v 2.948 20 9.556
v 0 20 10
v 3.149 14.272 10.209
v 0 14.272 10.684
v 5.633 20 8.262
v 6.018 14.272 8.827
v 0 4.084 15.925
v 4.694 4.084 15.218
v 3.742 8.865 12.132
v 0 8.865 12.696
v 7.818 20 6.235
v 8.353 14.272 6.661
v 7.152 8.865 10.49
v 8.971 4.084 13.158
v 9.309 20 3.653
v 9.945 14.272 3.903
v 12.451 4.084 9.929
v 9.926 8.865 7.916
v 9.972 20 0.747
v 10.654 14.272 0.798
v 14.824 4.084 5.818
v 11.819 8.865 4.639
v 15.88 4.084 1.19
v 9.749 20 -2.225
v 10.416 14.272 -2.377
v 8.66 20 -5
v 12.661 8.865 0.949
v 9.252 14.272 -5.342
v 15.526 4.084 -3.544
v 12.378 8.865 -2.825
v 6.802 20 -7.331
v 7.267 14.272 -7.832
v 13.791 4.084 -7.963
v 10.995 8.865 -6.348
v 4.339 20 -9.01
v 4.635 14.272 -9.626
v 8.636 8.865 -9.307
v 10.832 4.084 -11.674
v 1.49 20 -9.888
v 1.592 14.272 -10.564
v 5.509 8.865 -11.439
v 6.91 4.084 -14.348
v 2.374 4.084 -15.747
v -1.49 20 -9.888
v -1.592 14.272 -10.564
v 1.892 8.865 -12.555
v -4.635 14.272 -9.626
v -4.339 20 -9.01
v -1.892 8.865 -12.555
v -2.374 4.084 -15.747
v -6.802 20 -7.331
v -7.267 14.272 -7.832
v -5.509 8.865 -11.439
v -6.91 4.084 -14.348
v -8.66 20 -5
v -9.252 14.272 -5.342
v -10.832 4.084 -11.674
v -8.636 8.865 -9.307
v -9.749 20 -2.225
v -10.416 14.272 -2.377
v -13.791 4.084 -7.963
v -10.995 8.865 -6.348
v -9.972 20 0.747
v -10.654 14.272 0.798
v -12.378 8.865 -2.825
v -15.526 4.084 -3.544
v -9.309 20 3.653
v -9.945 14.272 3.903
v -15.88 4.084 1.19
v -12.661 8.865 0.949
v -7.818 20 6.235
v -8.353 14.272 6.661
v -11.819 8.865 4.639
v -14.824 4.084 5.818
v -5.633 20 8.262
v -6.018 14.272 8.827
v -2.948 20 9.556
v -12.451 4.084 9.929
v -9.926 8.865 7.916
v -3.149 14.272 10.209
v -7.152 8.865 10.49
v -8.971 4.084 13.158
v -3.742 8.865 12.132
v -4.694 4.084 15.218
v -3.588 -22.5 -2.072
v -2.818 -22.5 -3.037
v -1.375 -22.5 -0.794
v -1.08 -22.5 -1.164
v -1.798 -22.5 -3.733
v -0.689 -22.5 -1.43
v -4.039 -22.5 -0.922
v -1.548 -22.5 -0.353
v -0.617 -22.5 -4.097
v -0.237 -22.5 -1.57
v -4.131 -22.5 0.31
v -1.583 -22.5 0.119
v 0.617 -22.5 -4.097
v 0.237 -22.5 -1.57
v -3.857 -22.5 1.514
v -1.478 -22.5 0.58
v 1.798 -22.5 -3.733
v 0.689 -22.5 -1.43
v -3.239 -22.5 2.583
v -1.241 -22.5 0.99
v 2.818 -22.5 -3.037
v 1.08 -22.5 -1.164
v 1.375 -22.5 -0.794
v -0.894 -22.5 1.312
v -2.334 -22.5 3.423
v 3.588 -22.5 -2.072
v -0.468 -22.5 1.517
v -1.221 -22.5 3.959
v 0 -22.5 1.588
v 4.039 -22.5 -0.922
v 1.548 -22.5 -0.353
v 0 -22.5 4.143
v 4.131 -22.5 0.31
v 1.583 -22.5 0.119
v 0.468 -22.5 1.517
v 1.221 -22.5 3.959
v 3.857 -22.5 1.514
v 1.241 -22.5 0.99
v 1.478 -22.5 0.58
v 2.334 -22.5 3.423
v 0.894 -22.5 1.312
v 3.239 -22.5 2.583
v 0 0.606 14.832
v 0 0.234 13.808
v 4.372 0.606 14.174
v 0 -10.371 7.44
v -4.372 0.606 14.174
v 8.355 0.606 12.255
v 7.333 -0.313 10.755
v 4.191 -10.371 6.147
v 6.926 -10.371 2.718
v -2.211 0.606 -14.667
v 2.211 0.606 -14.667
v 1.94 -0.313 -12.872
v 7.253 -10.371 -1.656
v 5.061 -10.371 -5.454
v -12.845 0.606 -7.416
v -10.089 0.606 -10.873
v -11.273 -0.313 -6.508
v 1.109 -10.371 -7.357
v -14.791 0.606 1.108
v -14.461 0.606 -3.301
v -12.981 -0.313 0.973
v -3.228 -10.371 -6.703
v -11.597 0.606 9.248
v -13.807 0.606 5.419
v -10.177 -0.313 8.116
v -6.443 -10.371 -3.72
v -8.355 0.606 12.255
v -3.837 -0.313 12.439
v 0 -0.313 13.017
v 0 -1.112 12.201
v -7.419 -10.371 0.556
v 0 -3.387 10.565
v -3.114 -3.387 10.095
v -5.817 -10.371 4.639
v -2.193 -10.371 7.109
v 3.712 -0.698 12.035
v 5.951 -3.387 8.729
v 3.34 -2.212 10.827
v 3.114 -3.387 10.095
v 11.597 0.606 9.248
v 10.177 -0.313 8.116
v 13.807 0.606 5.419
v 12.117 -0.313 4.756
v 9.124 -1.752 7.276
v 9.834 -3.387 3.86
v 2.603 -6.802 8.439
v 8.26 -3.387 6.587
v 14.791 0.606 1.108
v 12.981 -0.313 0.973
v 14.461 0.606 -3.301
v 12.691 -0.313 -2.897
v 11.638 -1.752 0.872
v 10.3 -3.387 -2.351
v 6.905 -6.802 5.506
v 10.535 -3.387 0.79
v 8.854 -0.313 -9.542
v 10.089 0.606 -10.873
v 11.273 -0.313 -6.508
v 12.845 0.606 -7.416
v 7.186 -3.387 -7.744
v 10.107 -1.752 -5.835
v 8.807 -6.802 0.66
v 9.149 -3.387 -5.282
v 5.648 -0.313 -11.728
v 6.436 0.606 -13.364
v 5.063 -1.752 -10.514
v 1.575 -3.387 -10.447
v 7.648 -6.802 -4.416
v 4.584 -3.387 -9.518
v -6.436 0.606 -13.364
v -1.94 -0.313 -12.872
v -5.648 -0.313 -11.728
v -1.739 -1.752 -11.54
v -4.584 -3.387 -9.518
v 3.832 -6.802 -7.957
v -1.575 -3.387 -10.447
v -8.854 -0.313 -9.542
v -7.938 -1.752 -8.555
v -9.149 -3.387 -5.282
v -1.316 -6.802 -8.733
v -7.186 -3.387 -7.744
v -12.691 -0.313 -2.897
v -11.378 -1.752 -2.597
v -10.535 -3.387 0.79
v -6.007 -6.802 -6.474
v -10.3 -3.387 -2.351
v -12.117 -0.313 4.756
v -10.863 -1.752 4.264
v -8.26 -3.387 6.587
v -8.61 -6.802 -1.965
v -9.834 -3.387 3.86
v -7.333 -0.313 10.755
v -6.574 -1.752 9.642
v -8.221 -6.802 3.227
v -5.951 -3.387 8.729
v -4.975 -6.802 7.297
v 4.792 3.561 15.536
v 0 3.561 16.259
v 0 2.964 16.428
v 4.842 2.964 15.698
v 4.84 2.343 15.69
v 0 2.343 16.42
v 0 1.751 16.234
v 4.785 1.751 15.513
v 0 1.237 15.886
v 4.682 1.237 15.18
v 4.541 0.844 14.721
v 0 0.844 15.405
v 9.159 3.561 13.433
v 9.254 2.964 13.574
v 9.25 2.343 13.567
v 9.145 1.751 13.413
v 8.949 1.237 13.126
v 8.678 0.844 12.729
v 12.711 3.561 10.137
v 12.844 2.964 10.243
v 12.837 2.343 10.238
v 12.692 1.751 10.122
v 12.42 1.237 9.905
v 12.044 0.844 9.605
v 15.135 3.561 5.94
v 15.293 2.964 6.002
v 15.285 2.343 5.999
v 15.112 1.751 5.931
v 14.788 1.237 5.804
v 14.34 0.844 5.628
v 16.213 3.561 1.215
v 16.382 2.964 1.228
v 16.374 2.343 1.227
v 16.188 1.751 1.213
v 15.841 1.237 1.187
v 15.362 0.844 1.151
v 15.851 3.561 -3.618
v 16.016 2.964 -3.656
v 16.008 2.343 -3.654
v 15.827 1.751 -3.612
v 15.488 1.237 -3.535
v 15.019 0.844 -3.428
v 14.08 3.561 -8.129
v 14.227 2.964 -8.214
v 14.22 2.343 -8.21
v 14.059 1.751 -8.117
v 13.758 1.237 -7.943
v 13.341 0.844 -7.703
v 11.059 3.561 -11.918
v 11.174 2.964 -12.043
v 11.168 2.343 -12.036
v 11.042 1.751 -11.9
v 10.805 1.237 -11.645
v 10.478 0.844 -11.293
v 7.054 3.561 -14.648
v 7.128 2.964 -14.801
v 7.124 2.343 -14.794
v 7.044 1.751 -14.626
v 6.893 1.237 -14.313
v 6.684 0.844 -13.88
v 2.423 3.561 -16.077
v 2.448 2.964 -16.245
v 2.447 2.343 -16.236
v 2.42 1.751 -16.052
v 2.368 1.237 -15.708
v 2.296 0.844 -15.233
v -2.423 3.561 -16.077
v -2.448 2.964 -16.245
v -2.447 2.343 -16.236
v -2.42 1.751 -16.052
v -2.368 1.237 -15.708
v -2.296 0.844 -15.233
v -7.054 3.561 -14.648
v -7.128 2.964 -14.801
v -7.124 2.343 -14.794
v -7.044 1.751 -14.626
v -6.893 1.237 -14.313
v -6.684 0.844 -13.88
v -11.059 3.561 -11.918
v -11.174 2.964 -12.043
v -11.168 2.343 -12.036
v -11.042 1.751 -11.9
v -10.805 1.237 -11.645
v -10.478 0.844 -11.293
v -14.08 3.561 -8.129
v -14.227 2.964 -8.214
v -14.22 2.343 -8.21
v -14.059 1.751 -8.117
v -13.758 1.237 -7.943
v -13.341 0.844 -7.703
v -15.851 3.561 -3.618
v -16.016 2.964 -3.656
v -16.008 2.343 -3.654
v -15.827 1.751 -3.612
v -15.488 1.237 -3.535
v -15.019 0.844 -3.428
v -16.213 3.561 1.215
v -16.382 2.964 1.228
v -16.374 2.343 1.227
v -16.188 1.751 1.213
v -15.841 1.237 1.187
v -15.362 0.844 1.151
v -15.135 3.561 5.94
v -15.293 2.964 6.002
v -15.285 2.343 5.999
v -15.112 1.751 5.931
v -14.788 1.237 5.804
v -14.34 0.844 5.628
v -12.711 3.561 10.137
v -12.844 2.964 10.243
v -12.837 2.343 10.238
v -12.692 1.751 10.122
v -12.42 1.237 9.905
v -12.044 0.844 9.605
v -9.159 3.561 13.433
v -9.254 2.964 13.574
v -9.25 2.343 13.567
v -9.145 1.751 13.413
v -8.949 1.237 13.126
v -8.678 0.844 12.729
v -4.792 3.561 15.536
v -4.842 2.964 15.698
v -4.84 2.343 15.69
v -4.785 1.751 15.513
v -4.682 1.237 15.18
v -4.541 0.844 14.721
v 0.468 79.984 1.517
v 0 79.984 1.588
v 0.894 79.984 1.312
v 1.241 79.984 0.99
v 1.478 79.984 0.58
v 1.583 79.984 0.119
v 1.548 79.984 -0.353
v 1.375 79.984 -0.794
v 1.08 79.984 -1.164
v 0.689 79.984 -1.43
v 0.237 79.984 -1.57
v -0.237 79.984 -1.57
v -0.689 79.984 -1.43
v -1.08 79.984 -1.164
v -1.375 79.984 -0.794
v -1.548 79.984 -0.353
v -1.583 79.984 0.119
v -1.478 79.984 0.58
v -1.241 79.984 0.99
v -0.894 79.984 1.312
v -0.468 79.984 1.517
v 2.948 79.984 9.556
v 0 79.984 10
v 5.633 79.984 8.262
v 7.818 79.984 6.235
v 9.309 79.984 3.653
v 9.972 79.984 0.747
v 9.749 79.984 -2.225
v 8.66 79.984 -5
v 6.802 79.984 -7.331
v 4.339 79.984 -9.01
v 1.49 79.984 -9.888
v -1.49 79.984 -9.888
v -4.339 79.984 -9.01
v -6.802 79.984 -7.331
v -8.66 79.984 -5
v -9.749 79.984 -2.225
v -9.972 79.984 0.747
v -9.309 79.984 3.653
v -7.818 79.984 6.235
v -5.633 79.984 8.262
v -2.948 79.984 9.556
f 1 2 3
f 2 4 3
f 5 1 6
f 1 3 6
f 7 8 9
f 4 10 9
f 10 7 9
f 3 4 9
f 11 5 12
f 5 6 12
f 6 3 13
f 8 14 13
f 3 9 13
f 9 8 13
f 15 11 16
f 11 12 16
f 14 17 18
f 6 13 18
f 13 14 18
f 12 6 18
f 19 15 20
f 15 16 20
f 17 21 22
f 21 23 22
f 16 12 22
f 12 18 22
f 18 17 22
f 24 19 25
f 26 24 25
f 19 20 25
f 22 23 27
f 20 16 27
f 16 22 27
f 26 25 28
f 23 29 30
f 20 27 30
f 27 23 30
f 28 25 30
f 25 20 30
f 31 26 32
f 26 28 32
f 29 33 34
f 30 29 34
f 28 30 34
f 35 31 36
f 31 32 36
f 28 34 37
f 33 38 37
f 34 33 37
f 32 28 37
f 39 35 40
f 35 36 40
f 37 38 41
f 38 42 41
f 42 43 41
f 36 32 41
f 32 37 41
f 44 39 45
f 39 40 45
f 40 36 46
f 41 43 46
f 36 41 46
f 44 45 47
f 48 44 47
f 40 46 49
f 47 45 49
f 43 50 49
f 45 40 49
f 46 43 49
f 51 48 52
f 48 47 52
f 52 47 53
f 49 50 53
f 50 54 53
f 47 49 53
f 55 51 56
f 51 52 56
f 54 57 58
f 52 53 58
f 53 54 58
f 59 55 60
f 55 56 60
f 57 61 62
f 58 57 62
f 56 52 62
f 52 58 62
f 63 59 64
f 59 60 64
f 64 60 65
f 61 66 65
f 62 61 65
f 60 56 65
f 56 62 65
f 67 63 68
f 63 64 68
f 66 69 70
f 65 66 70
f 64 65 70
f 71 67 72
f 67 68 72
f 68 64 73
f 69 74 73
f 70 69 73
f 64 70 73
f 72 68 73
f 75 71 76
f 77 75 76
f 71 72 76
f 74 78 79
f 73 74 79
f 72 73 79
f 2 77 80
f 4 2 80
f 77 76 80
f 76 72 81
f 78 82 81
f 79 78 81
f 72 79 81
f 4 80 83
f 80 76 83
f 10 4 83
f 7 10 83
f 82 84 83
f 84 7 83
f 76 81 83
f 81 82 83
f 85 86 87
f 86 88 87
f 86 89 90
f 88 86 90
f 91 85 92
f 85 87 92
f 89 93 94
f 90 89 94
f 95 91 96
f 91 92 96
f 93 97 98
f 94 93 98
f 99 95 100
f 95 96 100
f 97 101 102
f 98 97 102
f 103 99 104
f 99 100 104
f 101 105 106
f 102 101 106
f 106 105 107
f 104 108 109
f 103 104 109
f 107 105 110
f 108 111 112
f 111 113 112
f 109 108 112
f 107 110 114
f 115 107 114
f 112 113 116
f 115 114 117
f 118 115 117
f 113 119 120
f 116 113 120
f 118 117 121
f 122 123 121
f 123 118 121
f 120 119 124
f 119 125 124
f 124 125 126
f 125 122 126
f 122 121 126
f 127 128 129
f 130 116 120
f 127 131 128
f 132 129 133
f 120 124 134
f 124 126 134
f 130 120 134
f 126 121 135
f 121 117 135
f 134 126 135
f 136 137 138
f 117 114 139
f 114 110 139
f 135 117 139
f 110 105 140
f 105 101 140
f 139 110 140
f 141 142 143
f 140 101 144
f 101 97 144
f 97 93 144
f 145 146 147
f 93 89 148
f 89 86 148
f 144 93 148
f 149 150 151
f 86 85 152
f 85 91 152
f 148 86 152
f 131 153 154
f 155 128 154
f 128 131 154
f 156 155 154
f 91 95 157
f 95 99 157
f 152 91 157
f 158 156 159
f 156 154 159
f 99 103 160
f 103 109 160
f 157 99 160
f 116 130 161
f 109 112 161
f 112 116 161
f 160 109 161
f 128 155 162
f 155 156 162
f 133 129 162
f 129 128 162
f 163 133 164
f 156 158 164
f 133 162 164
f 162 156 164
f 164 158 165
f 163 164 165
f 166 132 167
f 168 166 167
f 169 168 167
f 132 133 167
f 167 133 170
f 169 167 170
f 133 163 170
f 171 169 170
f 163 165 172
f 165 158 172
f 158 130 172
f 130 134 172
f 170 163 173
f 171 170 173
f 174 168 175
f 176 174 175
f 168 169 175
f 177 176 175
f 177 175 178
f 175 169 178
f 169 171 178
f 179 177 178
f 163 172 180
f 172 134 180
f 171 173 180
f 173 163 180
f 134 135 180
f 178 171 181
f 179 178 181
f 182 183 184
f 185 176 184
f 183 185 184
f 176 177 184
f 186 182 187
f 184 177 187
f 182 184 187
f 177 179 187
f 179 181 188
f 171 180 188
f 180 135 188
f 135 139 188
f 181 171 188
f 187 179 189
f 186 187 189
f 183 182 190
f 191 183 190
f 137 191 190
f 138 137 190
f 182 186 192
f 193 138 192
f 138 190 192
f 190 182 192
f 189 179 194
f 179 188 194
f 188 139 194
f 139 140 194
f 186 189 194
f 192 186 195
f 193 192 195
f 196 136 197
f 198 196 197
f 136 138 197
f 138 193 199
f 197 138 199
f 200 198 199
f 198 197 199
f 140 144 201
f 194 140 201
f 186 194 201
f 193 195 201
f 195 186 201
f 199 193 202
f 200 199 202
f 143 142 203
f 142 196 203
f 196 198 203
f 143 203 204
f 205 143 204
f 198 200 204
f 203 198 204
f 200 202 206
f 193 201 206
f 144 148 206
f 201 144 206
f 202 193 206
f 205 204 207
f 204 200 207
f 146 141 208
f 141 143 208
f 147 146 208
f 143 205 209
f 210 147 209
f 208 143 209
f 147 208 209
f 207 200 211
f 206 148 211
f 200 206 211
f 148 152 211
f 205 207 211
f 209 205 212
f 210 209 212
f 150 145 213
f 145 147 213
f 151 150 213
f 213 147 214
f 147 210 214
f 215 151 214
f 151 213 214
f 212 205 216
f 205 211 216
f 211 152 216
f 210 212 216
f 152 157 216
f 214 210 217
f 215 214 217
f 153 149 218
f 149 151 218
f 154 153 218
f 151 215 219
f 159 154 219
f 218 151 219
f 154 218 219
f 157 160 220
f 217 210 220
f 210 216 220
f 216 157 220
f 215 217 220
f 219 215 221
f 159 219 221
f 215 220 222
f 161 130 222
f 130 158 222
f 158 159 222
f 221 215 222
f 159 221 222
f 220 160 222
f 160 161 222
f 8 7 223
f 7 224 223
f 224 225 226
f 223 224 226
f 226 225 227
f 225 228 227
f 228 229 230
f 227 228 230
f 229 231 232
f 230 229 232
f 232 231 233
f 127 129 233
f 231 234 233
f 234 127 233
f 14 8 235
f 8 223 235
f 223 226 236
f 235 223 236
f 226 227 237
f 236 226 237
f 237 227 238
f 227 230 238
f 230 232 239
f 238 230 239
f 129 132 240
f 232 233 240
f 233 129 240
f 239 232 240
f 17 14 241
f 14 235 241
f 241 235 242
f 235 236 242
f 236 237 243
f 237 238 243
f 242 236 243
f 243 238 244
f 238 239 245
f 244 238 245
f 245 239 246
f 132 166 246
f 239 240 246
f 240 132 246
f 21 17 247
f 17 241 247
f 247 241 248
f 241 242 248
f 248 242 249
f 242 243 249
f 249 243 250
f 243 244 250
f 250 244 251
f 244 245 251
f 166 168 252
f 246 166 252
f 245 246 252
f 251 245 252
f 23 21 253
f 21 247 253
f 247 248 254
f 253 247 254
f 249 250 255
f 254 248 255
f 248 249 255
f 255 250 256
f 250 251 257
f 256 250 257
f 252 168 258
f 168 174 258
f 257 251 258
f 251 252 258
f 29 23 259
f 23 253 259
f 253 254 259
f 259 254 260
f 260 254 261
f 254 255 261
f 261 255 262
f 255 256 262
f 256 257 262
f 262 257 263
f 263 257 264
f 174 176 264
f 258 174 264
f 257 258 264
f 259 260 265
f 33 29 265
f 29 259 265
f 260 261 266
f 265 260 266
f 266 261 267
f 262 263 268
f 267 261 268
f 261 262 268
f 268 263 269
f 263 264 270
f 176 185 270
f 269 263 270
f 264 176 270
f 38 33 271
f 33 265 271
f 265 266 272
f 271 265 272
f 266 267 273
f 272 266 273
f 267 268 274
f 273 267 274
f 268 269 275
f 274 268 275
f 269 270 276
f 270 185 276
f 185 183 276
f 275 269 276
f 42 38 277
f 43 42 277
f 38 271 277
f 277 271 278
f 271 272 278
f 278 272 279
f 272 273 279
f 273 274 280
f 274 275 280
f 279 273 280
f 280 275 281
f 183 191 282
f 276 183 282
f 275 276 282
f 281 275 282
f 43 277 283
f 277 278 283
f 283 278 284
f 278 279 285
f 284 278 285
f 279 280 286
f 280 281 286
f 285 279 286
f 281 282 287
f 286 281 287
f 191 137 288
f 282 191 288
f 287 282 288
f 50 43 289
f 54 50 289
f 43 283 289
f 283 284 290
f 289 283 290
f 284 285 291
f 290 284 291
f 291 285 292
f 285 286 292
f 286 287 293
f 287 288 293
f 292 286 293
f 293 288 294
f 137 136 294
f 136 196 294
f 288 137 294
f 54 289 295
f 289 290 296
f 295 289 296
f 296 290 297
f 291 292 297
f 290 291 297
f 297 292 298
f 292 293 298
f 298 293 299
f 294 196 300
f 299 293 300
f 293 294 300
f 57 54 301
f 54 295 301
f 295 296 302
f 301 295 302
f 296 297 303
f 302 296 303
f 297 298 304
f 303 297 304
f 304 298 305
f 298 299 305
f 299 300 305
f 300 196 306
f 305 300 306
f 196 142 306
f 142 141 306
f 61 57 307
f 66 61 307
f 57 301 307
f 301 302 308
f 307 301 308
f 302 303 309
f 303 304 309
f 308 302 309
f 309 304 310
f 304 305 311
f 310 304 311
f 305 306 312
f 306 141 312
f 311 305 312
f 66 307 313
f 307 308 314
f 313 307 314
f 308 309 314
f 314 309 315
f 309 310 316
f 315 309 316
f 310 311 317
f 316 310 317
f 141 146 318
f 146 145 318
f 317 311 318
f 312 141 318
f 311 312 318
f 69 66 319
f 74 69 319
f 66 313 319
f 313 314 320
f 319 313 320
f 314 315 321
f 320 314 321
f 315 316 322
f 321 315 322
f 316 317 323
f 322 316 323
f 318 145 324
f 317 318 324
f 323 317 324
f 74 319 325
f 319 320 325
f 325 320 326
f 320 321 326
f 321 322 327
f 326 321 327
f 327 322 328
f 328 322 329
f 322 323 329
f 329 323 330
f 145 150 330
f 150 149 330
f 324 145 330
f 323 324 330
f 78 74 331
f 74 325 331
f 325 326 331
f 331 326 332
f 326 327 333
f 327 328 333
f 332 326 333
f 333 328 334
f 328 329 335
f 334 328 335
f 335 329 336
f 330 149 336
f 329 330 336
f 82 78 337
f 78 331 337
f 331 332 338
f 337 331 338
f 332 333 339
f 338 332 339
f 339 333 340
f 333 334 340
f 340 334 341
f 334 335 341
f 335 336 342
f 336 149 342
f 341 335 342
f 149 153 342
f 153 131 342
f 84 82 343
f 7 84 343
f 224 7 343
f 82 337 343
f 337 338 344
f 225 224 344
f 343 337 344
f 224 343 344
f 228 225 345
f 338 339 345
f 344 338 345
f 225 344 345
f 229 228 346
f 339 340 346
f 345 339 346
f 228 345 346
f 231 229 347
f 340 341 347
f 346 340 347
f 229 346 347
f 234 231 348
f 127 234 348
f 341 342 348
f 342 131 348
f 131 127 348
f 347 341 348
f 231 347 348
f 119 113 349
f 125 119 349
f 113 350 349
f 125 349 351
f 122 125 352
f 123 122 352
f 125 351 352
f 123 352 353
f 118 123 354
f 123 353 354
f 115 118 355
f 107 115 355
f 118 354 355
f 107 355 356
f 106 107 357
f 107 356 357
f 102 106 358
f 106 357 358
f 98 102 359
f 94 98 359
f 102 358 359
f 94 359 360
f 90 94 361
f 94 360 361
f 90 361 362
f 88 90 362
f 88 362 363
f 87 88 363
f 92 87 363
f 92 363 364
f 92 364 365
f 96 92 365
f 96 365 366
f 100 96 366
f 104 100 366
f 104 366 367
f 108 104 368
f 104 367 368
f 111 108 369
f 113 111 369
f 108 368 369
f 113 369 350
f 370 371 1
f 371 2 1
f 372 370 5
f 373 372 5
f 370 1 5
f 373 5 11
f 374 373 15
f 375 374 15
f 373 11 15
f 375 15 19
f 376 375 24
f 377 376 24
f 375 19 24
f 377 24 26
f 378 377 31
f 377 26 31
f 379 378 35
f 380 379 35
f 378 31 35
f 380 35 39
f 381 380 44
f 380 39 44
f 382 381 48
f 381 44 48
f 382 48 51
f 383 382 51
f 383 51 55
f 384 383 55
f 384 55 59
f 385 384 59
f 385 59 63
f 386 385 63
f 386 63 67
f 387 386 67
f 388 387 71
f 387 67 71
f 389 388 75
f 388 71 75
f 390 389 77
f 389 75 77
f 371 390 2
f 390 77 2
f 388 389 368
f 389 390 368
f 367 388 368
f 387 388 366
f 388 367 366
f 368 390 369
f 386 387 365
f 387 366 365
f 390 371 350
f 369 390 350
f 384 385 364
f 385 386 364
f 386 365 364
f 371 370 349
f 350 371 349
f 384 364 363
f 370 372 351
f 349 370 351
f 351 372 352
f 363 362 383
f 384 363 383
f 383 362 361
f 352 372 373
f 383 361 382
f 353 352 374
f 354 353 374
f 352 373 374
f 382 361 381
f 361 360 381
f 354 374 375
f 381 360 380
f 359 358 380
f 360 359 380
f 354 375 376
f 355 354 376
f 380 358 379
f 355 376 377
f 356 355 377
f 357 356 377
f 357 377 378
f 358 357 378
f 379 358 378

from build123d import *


with BuildPart() as part:
    # Sketch2 → Revolve1 (revolve)
    with BuildSketch(Plane(origin=(0, 0, 0), x_dir=(0, 0, -1), z_dir=(1, 0, 0))):
        with BuildLine():
            Line((-10, 79.984026871), (-10, 20))
            ThreePointArc((-10, 20), (-11.529300925, 11.508521396), (-15.925023202, 4.084129443))
            ThreePointArc((-15.925023202, 4.084129443), (-16.348258147, 2.040451452), (-14.8325, 0.6058))
            add(Edge.make_bspline(
                [(-14.8325, 0.6058), (-14.786589527, 0.594107912), (-14.720151881, 0.577188139), (-14.636942478, 0.555651214), (-14.584628983, 0.541606051), (-14.538694782, 0.529056302), (-14.496115893, 0.516807178), (-14.455377323, 0.504752713), (-14.415703886, 0.492601586), (-14.376608725, 0.480213978), (-14.337823066, 0.467258765), (-14.299073296, 0.453804959), (-14.260077477, 0.439967714), (-14.220832936, 0.425142489), (-14.181003545, 0.409828499), (-14.140639226, 0.39342794), (-14.099539827, 0.376264866), (-14.057643188, 0.358051468), (-14.015003626, 0.338576095), (-13.971270318, 0.318244004), (-13.926716478, 0.296334648), (-13.88091734, 0.273357564), (-13.834012449, 0.248879897), (-13.785997304, 0.222646856), (-13.736545511, 0.195147367), (-13.685880417, 0.165637059), (-13.63383256, 0.134329981), (-13.580202235, 0.101238986), (-13.525196985, 0.065829097), (-13.468489978, 0.028394376), (-13.410218497, -0.011527982), (-13.350168278, -0.053791023), (-13.288470654, -0.098900311), (-13.224788811, -0.146603335), (-13.159241207, -0.197326808), (-13.091855296, -0.251341181), (-13.022233522, -0.308401649), (-12.950733187, -0.369268693), (-12.87684498, -0.433607317), (-12.800942833, -0.50216692), (-12.722558879, -0.574690204), (-12.64180647, -0.651653184), (-12.558631713, -0.733330072), (-12.473007863, -0.820056033), (-12.384606656, -0.911877967), (-12.293655943, -1.009413525), (-12.19993662, -1.112809578), (-12.103181234, -1.222292158), (-12.003658589, -1.33855085), (-11.901000777, -1.461694366), (-11.795279131, -1.592272191), (-11.686428516, -1.730738869), (-11.574152693, -1.877409894), (-11.458536394, -2.032929305), (-11.339441079, -2.197751566), (-11.216906306, -2.372586938), (-11.090456233, -2.557718159), (-10.960339372, -2.754078467), (-10.826403135, -2.962267921), (-10.688322214, -3.182881678), (-10.546388799, -3.416882377), (-10.399982006, -3.664853532), (-10.249381335, -3.927893894), (-10.094533615, -4.206969526), (-9.93478729, -4.502781144), (-9.770600526, -4.816720029), (-9.601692365, -5.149846675), (-9.427661931, -5.50326599), (-9.248775965, -5.878475674), (-9.064645901, -6.276835238), (-8.87533319, -6.699902872), (-8.680516638, -7.149341121), (-8.480119182, -7.626897717), (-8.27419422, -8.134593345), (-8.062173697, -8.674341942), (-7.844473046, -9.248617697), (-7.620378546, -9.859652358), (-7.390143634, -10.510239162), (-7.15351637, -11.203263925), (-6.91022293, -11.941816272), (-6.660409366, -12.729407317), (-6.403463868, -13.569619022), (-6.13955877, -14.466660747), (-5.86859751, -15.425045871), (-5.58995818, -16.449575), (-5.30410545, -17.54587051), (-5.010246169, -18.719716622), (-4.708679684, -19.977884286), (-4.417462856, -21.247043384), (-4.229902291, -22.098318051), (-4.143040834, -22.5)],
                knots=[0, 0, 0, 0, 0.0026864, 0.003887524, 0.004873731, 0.005757813, 0.006587588, 0.007385986, 0.008166831, 0.008940344, 0.009711391, 0.010485479, 0.011266269, 0.012057584, 0.012864206, 0.013685875, 0.014528001, 0.015389717, 0.016276196, 0.017186037, 0.018124349, 0.019091365, 0.020091502, 0.021124214, 0.022193786, 0.02329991, 0.024448714, 0.025637823, 0.026873089, 0.028157979, 0.029490658, 0.030878236, 0.032321667, 0.033824319, 0.035389905, 0.037021117, 0.038721252, 0.040494021, 0.042345363, 0.044276569, 0.046293536, 0.048400508, 0.050601853, 0.052903384, 0.055310916, 0.057829088, 0.060465162, 0.063223709, 0.066113781, 0.069142731, 0.072314292, 0.075640292, 0.079129636, 0.082787821, 0.086628416, 0.090659818, 0.094893736, 0.099340772, 0.104016433, 0.108930498, 0.114098239, 0.119534774, 0.125258904, 0.131284732, 0.137631752, 0.144321681, 0.151373222, 0.158810235, 0.166659266, 0.174942777, 0.183694449, 0.192940456, 0.202718271, 0.21306062, 0.224006047, 0.235599981, 0.247884808, 0.260909978, 0.274731834, 0.289408721, 0.305001629, 0.321583099, 0.339229092, 0.358021891, 0.378056499, 0.39943301, 0.422263423, 0.446671009, 0.472795467, 0.496098755, 0.496098755, 0.496098755, 0.496098755], degree=3))
            Line((-4.143040834, -22.5), (-1.5875, -22.5))
            Line((-1.5875, -22.5), (-1.5875, 79.984026871))
            Line((-1.5875, 79.984026871), (-10, 79.984026871))
        make_face()
    revolve(axis=Axis((0, -48.8258, 0), (0, 1, 0)))


solid = part.part
